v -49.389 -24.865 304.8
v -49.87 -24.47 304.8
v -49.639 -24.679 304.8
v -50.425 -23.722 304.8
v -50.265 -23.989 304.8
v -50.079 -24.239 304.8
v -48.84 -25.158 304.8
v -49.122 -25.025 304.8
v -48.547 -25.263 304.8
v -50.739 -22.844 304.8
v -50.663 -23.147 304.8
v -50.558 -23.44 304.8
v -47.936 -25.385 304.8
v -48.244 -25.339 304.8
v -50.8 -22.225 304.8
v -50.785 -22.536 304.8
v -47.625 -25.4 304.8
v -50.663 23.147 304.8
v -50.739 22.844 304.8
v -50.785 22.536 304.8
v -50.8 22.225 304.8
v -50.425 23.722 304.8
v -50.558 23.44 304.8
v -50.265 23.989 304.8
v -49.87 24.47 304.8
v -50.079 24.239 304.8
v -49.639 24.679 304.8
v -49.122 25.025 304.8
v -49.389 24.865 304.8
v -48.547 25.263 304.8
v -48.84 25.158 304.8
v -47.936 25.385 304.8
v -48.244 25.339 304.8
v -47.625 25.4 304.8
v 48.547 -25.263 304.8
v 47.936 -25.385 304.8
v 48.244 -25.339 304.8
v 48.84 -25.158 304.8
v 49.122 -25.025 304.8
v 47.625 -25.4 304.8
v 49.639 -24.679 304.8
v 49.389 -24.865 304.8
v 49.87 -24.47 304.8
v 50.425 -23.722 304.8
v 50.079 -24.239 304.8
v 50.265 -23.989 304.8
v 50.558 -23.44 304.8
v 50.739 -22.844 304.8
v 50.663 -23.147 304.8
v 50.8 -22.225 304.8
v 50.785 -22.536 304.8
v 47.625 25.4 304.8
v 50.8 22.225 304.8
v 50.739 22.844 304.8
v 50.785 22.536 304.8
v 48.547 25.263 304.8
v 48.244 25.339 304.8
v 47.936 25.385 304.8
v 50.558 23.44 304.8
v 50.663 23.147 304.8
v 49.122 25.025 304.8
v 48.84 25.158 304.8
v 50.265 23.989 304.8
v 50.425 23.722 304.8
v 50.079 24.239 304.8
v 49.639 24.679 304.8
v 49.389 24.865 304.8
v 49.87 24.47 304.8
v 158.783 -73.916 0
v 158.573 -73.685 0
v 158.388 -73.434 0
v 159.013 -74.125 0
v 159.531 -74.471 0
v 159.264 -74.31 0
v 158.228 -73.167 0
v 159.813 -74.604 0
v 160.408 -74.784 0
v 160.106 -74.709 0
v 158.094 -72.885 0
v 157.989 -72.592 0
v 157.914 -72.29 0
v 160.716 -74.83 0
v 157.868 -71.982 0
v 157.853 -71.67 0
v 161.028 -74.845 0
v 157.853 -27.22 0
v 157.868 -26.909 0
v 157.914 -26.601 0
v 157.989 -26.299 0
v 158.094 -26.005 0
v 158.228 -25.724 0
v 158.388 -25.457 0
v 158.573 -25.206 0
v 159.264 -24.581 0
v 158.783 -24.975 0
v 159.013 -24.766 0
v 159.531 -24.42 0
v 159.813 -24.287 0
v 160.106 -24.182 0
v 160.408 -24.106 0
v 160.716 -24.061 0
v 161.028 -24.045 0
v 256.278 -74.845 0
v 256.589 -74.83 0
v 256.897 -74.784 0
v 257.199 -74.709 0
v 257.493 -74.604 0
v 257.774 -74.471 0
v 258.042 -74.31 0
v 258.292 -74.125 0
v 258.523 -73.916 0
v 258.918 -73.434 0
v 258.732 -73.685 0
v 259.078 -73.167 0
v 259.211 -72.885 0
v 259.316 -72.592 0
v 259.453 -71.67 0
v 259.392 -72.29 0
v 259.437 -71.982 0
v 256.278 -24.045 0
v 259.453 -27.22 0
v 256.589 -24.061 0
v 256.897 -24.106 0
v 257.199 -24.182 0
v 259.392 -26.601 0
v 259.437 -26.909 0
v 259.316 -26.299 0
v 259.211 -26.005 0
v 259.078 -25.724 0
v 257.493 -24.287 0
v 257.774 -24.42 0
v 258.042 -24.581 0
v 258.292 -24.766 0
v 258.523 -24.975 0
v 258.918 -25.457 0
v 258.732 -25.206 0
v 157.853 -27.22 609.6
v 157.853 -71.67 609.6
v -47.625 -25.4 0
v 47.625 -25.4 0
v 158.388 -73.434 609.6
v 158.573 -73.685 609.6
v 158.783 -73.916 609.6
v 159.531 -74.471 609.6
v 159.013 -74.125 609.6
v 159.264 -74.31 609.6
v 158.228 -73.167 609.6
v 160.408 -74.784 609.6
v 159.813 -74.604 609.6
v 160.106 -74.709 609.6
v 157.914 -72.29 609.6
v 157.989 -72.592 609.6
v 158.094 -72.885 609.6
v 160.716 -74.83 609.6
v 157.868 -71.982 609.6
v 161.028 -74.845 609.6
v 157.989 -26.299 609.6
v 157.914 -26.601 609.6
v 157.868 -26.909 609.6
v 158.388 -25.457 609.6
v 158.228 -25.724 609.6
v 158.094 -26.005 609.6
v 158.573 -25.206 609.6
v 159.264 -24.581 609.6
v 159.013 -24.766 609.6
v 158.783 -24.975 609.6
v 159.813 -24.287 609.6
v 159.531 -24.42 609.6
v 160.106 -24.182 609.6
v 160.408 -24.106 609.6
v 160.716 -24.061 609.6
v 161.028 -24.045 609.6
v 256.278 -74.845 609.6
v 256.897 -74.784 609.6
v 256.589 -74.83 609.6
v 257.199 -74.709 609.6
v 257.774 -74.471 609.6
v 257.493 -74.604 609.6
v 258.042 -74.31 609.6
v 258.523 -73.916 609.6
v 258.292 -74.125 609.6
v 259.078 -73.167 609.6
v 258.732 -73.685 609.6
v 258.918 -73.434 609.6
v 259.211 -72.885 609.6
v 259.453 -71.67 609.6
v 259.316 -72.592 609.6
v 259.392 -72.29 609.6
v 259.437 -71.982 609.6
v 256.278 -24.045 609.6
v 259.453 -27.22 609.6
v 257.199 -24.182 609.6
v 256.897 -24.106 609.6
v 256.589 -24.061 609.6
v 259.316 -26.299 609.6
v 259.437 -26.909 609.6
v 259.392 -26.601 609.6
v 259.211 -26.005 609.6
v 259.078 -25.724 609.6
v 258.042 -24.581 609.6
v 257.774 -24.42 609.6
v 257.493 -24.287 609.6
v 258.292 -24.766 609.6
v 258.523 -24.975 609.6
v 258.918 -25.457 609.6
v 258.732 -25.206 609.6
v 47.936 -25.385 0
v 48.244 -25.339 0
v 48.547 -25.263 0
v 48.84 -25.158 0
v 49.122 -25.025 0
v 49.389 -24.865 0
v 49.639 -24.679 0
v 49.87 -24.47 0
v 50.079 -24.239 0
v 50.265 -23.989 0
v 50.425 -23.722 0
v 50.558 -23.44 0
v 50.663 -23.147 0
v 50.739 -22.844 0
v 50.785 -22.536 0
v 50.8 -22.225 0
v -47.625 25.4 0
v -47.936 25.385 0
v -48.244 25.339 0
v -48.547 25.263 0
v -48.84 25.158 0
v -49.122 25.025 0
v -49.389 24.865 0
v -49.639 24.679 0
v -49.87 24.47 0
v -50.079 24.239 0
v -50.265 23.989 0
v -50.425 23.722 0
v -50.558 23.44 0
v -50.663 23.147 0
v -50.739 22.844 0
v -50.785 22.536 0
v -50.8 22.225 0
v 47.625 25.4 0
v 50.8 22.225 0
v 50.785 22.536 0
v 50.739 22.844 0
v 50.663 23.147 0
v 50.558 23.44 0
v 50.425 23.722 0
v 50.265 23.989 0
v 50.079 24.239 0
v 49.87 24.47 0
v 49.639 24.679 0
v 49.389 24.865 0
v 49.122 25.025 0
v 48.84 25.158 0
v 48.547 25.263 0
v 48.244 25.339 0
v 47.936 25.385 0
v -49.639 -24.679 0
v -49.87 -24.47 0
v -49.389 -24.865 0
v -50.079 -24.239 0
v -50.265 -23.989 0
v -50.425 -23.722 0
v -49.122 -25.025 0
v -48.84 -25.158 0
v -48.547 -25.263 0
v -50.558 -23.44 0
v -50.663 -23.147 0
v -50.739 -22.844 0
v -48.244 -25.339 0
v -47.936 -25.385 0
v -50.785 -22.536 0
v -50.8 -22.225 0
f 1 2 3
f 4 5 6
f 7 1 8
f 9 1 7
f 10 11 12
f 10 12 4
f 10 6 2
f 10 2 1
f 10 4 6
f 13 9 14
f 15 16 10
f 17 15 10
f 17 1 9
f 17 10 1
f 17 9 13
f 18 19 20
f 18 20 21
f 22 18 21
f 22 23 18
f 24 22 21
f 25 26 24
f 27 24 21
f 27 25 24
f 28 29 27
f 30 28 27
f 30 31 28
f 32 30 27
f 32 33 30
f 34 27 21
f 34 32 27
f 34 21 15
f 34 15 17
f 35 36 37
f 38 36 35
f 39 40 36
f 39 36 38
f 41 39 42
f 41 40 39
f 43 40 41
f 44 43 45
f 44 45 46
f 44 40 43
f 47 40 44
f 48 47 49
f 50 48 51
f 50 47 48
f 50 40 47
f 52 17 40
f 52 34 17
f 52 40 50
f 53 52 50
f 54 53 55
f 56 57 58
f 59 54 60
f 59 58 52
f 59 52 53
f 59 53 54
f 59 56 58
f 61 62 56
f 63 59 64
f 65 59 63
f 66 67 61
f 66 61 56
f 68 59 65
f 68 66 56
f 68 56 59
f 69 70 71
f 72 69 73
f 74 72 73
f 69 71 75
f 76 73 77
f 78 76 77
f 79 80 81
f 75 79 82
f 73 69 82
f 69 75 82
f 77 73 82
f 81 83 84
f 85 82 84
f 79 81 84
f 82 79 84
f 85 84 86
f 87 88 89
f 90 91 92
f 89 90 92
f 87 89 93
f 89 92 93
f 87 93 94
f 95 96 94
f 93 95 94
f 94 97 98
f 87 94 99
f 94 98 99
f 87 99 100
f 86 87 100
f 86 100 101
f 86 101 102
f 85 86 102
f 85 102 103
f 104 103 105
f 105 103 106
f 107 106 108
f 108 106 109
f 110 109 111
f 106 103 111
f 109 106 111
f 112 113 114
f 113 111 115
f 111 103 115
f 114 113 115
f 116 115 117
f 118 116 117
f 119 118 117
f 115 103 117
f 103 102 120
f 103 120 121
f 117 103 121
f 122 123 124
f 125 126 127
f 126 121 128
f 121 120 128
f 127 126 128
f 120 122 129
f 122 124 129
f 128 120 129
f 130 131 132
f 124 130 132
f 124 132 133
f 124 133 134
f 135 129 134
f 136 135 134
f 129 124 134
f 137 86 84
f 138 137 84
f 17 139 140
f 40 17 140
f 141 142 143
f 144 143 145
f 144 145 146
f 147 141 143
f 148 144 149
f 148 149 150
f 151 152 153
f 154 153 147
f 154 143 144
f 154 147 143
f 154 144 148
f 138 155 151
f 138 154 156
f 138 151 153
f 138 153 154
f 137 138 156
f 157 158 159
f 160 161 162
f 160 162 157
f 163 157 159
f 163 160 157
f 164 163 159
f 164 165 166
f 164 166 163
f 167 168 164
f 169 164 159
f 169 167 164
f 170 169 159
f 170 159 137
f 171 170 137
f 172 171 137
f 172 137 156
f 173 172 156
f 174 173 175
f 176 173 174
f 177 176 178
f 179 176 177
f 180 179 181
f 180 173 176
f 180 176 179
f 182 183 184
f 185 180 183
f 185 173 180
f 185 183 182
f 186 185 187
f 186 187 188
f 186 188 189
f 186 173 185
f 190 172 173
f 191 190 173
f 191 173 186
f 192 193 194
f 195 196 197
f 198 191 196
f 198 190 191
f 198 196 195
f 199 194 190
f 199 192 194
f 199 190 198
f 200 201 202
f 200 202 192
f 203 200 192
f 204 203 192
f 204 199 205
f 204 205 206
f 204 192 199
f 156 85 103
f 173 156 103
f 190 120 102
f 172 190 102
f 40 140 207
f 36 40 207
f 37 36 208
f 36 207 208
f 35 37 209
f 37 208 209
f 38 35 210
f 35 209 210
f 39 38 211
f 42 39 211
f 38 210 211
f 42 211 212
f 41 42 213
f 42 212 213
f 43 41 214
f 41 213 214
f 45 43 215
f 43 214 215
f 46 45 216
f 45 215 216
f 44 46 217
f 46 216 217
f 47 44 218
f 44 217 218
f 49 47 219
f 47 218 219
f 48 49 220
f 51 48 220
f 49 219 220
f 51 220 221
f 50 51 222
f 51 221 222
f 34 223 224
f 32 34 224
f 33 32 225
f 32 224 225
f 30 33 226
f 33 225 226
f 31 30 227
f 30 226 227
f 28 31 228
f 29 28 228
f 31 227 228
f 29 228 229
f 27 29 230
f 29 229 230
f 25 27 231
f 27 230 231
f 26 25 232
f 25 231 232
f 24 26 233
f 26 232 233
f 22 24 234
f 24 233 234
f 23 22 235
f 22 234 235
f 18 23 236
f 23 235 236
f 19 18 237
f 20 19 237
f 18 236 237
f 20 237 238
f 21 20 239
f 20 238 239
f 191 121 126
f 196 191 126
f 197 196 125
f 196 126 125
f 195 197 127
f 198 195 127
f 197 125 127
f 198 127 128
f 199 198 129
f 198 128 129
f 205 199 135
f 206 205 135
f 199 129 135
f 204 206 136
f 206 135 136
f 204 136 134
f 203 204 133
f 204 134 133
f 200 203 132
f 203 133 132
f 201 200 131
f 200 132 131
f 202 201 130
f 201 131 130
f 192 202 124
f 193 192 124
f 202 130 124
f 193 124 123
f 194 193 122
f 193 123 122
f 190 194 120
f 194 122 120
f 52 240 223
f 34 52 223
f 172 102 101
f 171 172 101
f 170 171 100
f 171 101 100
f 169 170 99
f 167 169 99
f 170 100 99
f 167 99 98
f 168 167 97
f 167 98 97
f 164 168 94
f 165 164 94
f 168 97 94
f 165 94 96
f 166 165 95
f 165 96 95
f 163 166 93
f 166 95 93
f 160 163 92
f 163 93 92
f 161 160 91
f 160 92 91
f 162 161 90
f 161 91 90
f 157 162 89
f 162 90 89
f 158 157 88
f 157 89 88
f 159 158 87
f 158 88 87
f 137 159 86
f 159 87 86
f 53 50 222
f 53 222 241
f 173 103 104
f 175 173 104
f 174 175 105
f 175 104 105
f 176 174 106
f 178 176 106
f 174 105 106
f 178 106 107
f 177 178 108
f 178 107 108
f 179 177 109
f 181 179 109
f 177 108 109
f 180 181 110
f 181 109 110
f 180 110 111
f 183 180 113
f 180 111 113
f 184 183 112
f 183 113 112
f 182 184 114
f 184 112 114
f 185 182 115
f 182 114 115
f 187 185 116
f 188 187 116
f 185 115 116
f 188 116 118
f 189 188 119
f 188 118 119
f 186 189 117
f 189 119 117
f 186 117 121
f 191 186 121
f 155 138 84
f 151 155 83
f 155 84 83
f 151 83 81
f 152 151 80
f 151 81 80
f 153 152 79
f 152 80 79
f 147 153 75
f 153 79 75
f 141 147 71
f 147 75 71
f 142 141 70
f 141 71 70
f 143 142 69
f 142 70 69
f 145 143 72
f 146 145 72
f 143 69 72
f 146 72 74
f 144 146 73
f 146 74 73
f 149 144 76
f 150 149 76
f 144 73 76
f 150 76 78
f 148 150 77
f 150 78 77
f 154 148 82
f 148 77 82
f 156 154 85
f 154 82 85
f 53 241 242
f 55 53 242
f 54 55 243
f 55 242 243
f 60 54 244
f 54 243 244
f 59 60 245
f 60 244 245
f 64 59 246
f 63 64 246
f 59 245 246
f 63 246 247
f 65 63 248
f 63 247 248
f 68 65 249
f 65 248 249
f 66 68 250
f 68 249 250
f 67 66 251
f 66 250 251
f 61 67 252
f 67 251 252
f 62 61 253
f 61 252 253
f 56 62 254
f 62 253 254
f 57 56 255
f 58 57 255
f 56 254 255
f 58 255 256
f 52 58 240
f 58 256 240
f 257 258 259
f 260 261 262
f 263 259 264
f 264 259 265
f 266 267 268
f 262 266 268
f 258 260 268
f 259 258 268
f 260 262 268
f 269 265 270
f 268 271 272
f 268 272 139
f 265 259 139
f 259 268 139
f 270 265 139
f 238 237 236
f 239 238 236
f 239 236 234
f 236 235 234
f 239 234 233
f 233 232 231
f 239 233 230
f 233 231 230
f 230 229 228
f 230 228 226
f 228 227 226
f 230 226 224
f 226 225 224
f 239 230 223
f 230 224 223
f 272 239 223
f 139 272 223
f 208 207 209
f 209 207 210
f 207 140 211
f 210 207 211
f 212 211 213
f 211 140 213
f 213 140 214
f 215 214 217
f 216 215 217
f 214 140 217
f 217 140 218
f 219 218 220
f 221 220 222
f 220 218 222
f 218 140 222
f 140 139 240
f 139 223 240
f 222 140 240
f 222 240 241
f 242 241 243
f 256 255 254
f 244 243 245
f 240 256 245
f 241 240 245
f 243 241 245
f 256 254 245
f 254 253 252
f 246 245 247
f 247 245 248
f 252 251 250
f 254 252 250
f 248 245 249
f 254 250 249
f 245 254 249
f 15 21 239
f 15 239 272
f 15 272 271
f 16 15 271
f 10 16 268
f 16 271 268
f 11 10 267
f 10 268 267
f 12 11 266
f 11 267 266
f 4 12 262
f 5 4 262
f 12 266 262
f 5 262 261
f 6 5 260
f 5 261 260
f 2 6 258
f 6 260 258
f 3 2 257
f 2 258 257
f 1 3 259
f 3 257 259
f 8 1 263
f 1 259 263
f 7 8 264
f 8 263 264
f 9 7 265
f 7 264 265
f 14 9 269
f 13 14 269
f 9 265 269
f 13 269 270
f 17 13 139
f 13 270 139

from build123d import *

# Parameters (mm, degrees)
F1_DEPTH = 304.8
F3_DEPTH = 609.6


with BuildPart() as f1:
    # F0 (on Top) → F1 (new body)
    with BuildSketch(Plane.XY):
        with BuildLine():
            Line((-47.625, -25.4), (47.625, -25.4))
            ThreePointArc((47.625, -25.4), (49.870064, -24.470064), (50.8, -22.225))
            Line((50.8, -22.225), (50.8, 22.225))
            ThreePointArc((50.8, 22.225), (49.870064, 24.470064), (47.625, 25.4))
            Line((47.625, 25.4), (-47.625, 25.4))
            ThreePointArc((-47.625, 25.4), (-49.870064, 24.470064), (-50.8, 22.225))
            Line((-50.8, 22.225), (-50.8, -22.225))
            ThreePointArc((-50.8, -22.225), (-49.870064, -24.470064), (-47.625, -25.4))
        make_face()
    extrude(amount=F1_DEPTH)


with BuildPart() as f3:
    # F2 (on Top) → F3 (new body)
    with BuildSketch(Plane.XY):
        with BuildLine():
            Line((161.027675, -74.845441), (256.277675, -74.845441))
            ThreePointArc((256.277675, -74.845441), (258.522739, -73.915505), (259.452675, -71.670441))
            Line((259.452675, -71.670441), (259.452675, -27.220441))
            ThreePointArc((259.452675, -27.220441), (258.522739, -24.975377), (256.277675, -24.045441))
            Line((256.277675, -24.045441), (161.027675, -24.045441))
            ThreePointArc((161.027675, -24.045441), (158.782611, -24.975377), (157.852675, -27.220441))
            Line((157.852675, -27.220441), (157.852675, -71.670441))
            ThreePointArc((157.852675, -71.670441), (158.782611, -73.915505), (161.027675, -74.845441))
        make_face()
    extrude(amount=F3_DEPTH)


solid = Compound([f1.part, f3.part])
